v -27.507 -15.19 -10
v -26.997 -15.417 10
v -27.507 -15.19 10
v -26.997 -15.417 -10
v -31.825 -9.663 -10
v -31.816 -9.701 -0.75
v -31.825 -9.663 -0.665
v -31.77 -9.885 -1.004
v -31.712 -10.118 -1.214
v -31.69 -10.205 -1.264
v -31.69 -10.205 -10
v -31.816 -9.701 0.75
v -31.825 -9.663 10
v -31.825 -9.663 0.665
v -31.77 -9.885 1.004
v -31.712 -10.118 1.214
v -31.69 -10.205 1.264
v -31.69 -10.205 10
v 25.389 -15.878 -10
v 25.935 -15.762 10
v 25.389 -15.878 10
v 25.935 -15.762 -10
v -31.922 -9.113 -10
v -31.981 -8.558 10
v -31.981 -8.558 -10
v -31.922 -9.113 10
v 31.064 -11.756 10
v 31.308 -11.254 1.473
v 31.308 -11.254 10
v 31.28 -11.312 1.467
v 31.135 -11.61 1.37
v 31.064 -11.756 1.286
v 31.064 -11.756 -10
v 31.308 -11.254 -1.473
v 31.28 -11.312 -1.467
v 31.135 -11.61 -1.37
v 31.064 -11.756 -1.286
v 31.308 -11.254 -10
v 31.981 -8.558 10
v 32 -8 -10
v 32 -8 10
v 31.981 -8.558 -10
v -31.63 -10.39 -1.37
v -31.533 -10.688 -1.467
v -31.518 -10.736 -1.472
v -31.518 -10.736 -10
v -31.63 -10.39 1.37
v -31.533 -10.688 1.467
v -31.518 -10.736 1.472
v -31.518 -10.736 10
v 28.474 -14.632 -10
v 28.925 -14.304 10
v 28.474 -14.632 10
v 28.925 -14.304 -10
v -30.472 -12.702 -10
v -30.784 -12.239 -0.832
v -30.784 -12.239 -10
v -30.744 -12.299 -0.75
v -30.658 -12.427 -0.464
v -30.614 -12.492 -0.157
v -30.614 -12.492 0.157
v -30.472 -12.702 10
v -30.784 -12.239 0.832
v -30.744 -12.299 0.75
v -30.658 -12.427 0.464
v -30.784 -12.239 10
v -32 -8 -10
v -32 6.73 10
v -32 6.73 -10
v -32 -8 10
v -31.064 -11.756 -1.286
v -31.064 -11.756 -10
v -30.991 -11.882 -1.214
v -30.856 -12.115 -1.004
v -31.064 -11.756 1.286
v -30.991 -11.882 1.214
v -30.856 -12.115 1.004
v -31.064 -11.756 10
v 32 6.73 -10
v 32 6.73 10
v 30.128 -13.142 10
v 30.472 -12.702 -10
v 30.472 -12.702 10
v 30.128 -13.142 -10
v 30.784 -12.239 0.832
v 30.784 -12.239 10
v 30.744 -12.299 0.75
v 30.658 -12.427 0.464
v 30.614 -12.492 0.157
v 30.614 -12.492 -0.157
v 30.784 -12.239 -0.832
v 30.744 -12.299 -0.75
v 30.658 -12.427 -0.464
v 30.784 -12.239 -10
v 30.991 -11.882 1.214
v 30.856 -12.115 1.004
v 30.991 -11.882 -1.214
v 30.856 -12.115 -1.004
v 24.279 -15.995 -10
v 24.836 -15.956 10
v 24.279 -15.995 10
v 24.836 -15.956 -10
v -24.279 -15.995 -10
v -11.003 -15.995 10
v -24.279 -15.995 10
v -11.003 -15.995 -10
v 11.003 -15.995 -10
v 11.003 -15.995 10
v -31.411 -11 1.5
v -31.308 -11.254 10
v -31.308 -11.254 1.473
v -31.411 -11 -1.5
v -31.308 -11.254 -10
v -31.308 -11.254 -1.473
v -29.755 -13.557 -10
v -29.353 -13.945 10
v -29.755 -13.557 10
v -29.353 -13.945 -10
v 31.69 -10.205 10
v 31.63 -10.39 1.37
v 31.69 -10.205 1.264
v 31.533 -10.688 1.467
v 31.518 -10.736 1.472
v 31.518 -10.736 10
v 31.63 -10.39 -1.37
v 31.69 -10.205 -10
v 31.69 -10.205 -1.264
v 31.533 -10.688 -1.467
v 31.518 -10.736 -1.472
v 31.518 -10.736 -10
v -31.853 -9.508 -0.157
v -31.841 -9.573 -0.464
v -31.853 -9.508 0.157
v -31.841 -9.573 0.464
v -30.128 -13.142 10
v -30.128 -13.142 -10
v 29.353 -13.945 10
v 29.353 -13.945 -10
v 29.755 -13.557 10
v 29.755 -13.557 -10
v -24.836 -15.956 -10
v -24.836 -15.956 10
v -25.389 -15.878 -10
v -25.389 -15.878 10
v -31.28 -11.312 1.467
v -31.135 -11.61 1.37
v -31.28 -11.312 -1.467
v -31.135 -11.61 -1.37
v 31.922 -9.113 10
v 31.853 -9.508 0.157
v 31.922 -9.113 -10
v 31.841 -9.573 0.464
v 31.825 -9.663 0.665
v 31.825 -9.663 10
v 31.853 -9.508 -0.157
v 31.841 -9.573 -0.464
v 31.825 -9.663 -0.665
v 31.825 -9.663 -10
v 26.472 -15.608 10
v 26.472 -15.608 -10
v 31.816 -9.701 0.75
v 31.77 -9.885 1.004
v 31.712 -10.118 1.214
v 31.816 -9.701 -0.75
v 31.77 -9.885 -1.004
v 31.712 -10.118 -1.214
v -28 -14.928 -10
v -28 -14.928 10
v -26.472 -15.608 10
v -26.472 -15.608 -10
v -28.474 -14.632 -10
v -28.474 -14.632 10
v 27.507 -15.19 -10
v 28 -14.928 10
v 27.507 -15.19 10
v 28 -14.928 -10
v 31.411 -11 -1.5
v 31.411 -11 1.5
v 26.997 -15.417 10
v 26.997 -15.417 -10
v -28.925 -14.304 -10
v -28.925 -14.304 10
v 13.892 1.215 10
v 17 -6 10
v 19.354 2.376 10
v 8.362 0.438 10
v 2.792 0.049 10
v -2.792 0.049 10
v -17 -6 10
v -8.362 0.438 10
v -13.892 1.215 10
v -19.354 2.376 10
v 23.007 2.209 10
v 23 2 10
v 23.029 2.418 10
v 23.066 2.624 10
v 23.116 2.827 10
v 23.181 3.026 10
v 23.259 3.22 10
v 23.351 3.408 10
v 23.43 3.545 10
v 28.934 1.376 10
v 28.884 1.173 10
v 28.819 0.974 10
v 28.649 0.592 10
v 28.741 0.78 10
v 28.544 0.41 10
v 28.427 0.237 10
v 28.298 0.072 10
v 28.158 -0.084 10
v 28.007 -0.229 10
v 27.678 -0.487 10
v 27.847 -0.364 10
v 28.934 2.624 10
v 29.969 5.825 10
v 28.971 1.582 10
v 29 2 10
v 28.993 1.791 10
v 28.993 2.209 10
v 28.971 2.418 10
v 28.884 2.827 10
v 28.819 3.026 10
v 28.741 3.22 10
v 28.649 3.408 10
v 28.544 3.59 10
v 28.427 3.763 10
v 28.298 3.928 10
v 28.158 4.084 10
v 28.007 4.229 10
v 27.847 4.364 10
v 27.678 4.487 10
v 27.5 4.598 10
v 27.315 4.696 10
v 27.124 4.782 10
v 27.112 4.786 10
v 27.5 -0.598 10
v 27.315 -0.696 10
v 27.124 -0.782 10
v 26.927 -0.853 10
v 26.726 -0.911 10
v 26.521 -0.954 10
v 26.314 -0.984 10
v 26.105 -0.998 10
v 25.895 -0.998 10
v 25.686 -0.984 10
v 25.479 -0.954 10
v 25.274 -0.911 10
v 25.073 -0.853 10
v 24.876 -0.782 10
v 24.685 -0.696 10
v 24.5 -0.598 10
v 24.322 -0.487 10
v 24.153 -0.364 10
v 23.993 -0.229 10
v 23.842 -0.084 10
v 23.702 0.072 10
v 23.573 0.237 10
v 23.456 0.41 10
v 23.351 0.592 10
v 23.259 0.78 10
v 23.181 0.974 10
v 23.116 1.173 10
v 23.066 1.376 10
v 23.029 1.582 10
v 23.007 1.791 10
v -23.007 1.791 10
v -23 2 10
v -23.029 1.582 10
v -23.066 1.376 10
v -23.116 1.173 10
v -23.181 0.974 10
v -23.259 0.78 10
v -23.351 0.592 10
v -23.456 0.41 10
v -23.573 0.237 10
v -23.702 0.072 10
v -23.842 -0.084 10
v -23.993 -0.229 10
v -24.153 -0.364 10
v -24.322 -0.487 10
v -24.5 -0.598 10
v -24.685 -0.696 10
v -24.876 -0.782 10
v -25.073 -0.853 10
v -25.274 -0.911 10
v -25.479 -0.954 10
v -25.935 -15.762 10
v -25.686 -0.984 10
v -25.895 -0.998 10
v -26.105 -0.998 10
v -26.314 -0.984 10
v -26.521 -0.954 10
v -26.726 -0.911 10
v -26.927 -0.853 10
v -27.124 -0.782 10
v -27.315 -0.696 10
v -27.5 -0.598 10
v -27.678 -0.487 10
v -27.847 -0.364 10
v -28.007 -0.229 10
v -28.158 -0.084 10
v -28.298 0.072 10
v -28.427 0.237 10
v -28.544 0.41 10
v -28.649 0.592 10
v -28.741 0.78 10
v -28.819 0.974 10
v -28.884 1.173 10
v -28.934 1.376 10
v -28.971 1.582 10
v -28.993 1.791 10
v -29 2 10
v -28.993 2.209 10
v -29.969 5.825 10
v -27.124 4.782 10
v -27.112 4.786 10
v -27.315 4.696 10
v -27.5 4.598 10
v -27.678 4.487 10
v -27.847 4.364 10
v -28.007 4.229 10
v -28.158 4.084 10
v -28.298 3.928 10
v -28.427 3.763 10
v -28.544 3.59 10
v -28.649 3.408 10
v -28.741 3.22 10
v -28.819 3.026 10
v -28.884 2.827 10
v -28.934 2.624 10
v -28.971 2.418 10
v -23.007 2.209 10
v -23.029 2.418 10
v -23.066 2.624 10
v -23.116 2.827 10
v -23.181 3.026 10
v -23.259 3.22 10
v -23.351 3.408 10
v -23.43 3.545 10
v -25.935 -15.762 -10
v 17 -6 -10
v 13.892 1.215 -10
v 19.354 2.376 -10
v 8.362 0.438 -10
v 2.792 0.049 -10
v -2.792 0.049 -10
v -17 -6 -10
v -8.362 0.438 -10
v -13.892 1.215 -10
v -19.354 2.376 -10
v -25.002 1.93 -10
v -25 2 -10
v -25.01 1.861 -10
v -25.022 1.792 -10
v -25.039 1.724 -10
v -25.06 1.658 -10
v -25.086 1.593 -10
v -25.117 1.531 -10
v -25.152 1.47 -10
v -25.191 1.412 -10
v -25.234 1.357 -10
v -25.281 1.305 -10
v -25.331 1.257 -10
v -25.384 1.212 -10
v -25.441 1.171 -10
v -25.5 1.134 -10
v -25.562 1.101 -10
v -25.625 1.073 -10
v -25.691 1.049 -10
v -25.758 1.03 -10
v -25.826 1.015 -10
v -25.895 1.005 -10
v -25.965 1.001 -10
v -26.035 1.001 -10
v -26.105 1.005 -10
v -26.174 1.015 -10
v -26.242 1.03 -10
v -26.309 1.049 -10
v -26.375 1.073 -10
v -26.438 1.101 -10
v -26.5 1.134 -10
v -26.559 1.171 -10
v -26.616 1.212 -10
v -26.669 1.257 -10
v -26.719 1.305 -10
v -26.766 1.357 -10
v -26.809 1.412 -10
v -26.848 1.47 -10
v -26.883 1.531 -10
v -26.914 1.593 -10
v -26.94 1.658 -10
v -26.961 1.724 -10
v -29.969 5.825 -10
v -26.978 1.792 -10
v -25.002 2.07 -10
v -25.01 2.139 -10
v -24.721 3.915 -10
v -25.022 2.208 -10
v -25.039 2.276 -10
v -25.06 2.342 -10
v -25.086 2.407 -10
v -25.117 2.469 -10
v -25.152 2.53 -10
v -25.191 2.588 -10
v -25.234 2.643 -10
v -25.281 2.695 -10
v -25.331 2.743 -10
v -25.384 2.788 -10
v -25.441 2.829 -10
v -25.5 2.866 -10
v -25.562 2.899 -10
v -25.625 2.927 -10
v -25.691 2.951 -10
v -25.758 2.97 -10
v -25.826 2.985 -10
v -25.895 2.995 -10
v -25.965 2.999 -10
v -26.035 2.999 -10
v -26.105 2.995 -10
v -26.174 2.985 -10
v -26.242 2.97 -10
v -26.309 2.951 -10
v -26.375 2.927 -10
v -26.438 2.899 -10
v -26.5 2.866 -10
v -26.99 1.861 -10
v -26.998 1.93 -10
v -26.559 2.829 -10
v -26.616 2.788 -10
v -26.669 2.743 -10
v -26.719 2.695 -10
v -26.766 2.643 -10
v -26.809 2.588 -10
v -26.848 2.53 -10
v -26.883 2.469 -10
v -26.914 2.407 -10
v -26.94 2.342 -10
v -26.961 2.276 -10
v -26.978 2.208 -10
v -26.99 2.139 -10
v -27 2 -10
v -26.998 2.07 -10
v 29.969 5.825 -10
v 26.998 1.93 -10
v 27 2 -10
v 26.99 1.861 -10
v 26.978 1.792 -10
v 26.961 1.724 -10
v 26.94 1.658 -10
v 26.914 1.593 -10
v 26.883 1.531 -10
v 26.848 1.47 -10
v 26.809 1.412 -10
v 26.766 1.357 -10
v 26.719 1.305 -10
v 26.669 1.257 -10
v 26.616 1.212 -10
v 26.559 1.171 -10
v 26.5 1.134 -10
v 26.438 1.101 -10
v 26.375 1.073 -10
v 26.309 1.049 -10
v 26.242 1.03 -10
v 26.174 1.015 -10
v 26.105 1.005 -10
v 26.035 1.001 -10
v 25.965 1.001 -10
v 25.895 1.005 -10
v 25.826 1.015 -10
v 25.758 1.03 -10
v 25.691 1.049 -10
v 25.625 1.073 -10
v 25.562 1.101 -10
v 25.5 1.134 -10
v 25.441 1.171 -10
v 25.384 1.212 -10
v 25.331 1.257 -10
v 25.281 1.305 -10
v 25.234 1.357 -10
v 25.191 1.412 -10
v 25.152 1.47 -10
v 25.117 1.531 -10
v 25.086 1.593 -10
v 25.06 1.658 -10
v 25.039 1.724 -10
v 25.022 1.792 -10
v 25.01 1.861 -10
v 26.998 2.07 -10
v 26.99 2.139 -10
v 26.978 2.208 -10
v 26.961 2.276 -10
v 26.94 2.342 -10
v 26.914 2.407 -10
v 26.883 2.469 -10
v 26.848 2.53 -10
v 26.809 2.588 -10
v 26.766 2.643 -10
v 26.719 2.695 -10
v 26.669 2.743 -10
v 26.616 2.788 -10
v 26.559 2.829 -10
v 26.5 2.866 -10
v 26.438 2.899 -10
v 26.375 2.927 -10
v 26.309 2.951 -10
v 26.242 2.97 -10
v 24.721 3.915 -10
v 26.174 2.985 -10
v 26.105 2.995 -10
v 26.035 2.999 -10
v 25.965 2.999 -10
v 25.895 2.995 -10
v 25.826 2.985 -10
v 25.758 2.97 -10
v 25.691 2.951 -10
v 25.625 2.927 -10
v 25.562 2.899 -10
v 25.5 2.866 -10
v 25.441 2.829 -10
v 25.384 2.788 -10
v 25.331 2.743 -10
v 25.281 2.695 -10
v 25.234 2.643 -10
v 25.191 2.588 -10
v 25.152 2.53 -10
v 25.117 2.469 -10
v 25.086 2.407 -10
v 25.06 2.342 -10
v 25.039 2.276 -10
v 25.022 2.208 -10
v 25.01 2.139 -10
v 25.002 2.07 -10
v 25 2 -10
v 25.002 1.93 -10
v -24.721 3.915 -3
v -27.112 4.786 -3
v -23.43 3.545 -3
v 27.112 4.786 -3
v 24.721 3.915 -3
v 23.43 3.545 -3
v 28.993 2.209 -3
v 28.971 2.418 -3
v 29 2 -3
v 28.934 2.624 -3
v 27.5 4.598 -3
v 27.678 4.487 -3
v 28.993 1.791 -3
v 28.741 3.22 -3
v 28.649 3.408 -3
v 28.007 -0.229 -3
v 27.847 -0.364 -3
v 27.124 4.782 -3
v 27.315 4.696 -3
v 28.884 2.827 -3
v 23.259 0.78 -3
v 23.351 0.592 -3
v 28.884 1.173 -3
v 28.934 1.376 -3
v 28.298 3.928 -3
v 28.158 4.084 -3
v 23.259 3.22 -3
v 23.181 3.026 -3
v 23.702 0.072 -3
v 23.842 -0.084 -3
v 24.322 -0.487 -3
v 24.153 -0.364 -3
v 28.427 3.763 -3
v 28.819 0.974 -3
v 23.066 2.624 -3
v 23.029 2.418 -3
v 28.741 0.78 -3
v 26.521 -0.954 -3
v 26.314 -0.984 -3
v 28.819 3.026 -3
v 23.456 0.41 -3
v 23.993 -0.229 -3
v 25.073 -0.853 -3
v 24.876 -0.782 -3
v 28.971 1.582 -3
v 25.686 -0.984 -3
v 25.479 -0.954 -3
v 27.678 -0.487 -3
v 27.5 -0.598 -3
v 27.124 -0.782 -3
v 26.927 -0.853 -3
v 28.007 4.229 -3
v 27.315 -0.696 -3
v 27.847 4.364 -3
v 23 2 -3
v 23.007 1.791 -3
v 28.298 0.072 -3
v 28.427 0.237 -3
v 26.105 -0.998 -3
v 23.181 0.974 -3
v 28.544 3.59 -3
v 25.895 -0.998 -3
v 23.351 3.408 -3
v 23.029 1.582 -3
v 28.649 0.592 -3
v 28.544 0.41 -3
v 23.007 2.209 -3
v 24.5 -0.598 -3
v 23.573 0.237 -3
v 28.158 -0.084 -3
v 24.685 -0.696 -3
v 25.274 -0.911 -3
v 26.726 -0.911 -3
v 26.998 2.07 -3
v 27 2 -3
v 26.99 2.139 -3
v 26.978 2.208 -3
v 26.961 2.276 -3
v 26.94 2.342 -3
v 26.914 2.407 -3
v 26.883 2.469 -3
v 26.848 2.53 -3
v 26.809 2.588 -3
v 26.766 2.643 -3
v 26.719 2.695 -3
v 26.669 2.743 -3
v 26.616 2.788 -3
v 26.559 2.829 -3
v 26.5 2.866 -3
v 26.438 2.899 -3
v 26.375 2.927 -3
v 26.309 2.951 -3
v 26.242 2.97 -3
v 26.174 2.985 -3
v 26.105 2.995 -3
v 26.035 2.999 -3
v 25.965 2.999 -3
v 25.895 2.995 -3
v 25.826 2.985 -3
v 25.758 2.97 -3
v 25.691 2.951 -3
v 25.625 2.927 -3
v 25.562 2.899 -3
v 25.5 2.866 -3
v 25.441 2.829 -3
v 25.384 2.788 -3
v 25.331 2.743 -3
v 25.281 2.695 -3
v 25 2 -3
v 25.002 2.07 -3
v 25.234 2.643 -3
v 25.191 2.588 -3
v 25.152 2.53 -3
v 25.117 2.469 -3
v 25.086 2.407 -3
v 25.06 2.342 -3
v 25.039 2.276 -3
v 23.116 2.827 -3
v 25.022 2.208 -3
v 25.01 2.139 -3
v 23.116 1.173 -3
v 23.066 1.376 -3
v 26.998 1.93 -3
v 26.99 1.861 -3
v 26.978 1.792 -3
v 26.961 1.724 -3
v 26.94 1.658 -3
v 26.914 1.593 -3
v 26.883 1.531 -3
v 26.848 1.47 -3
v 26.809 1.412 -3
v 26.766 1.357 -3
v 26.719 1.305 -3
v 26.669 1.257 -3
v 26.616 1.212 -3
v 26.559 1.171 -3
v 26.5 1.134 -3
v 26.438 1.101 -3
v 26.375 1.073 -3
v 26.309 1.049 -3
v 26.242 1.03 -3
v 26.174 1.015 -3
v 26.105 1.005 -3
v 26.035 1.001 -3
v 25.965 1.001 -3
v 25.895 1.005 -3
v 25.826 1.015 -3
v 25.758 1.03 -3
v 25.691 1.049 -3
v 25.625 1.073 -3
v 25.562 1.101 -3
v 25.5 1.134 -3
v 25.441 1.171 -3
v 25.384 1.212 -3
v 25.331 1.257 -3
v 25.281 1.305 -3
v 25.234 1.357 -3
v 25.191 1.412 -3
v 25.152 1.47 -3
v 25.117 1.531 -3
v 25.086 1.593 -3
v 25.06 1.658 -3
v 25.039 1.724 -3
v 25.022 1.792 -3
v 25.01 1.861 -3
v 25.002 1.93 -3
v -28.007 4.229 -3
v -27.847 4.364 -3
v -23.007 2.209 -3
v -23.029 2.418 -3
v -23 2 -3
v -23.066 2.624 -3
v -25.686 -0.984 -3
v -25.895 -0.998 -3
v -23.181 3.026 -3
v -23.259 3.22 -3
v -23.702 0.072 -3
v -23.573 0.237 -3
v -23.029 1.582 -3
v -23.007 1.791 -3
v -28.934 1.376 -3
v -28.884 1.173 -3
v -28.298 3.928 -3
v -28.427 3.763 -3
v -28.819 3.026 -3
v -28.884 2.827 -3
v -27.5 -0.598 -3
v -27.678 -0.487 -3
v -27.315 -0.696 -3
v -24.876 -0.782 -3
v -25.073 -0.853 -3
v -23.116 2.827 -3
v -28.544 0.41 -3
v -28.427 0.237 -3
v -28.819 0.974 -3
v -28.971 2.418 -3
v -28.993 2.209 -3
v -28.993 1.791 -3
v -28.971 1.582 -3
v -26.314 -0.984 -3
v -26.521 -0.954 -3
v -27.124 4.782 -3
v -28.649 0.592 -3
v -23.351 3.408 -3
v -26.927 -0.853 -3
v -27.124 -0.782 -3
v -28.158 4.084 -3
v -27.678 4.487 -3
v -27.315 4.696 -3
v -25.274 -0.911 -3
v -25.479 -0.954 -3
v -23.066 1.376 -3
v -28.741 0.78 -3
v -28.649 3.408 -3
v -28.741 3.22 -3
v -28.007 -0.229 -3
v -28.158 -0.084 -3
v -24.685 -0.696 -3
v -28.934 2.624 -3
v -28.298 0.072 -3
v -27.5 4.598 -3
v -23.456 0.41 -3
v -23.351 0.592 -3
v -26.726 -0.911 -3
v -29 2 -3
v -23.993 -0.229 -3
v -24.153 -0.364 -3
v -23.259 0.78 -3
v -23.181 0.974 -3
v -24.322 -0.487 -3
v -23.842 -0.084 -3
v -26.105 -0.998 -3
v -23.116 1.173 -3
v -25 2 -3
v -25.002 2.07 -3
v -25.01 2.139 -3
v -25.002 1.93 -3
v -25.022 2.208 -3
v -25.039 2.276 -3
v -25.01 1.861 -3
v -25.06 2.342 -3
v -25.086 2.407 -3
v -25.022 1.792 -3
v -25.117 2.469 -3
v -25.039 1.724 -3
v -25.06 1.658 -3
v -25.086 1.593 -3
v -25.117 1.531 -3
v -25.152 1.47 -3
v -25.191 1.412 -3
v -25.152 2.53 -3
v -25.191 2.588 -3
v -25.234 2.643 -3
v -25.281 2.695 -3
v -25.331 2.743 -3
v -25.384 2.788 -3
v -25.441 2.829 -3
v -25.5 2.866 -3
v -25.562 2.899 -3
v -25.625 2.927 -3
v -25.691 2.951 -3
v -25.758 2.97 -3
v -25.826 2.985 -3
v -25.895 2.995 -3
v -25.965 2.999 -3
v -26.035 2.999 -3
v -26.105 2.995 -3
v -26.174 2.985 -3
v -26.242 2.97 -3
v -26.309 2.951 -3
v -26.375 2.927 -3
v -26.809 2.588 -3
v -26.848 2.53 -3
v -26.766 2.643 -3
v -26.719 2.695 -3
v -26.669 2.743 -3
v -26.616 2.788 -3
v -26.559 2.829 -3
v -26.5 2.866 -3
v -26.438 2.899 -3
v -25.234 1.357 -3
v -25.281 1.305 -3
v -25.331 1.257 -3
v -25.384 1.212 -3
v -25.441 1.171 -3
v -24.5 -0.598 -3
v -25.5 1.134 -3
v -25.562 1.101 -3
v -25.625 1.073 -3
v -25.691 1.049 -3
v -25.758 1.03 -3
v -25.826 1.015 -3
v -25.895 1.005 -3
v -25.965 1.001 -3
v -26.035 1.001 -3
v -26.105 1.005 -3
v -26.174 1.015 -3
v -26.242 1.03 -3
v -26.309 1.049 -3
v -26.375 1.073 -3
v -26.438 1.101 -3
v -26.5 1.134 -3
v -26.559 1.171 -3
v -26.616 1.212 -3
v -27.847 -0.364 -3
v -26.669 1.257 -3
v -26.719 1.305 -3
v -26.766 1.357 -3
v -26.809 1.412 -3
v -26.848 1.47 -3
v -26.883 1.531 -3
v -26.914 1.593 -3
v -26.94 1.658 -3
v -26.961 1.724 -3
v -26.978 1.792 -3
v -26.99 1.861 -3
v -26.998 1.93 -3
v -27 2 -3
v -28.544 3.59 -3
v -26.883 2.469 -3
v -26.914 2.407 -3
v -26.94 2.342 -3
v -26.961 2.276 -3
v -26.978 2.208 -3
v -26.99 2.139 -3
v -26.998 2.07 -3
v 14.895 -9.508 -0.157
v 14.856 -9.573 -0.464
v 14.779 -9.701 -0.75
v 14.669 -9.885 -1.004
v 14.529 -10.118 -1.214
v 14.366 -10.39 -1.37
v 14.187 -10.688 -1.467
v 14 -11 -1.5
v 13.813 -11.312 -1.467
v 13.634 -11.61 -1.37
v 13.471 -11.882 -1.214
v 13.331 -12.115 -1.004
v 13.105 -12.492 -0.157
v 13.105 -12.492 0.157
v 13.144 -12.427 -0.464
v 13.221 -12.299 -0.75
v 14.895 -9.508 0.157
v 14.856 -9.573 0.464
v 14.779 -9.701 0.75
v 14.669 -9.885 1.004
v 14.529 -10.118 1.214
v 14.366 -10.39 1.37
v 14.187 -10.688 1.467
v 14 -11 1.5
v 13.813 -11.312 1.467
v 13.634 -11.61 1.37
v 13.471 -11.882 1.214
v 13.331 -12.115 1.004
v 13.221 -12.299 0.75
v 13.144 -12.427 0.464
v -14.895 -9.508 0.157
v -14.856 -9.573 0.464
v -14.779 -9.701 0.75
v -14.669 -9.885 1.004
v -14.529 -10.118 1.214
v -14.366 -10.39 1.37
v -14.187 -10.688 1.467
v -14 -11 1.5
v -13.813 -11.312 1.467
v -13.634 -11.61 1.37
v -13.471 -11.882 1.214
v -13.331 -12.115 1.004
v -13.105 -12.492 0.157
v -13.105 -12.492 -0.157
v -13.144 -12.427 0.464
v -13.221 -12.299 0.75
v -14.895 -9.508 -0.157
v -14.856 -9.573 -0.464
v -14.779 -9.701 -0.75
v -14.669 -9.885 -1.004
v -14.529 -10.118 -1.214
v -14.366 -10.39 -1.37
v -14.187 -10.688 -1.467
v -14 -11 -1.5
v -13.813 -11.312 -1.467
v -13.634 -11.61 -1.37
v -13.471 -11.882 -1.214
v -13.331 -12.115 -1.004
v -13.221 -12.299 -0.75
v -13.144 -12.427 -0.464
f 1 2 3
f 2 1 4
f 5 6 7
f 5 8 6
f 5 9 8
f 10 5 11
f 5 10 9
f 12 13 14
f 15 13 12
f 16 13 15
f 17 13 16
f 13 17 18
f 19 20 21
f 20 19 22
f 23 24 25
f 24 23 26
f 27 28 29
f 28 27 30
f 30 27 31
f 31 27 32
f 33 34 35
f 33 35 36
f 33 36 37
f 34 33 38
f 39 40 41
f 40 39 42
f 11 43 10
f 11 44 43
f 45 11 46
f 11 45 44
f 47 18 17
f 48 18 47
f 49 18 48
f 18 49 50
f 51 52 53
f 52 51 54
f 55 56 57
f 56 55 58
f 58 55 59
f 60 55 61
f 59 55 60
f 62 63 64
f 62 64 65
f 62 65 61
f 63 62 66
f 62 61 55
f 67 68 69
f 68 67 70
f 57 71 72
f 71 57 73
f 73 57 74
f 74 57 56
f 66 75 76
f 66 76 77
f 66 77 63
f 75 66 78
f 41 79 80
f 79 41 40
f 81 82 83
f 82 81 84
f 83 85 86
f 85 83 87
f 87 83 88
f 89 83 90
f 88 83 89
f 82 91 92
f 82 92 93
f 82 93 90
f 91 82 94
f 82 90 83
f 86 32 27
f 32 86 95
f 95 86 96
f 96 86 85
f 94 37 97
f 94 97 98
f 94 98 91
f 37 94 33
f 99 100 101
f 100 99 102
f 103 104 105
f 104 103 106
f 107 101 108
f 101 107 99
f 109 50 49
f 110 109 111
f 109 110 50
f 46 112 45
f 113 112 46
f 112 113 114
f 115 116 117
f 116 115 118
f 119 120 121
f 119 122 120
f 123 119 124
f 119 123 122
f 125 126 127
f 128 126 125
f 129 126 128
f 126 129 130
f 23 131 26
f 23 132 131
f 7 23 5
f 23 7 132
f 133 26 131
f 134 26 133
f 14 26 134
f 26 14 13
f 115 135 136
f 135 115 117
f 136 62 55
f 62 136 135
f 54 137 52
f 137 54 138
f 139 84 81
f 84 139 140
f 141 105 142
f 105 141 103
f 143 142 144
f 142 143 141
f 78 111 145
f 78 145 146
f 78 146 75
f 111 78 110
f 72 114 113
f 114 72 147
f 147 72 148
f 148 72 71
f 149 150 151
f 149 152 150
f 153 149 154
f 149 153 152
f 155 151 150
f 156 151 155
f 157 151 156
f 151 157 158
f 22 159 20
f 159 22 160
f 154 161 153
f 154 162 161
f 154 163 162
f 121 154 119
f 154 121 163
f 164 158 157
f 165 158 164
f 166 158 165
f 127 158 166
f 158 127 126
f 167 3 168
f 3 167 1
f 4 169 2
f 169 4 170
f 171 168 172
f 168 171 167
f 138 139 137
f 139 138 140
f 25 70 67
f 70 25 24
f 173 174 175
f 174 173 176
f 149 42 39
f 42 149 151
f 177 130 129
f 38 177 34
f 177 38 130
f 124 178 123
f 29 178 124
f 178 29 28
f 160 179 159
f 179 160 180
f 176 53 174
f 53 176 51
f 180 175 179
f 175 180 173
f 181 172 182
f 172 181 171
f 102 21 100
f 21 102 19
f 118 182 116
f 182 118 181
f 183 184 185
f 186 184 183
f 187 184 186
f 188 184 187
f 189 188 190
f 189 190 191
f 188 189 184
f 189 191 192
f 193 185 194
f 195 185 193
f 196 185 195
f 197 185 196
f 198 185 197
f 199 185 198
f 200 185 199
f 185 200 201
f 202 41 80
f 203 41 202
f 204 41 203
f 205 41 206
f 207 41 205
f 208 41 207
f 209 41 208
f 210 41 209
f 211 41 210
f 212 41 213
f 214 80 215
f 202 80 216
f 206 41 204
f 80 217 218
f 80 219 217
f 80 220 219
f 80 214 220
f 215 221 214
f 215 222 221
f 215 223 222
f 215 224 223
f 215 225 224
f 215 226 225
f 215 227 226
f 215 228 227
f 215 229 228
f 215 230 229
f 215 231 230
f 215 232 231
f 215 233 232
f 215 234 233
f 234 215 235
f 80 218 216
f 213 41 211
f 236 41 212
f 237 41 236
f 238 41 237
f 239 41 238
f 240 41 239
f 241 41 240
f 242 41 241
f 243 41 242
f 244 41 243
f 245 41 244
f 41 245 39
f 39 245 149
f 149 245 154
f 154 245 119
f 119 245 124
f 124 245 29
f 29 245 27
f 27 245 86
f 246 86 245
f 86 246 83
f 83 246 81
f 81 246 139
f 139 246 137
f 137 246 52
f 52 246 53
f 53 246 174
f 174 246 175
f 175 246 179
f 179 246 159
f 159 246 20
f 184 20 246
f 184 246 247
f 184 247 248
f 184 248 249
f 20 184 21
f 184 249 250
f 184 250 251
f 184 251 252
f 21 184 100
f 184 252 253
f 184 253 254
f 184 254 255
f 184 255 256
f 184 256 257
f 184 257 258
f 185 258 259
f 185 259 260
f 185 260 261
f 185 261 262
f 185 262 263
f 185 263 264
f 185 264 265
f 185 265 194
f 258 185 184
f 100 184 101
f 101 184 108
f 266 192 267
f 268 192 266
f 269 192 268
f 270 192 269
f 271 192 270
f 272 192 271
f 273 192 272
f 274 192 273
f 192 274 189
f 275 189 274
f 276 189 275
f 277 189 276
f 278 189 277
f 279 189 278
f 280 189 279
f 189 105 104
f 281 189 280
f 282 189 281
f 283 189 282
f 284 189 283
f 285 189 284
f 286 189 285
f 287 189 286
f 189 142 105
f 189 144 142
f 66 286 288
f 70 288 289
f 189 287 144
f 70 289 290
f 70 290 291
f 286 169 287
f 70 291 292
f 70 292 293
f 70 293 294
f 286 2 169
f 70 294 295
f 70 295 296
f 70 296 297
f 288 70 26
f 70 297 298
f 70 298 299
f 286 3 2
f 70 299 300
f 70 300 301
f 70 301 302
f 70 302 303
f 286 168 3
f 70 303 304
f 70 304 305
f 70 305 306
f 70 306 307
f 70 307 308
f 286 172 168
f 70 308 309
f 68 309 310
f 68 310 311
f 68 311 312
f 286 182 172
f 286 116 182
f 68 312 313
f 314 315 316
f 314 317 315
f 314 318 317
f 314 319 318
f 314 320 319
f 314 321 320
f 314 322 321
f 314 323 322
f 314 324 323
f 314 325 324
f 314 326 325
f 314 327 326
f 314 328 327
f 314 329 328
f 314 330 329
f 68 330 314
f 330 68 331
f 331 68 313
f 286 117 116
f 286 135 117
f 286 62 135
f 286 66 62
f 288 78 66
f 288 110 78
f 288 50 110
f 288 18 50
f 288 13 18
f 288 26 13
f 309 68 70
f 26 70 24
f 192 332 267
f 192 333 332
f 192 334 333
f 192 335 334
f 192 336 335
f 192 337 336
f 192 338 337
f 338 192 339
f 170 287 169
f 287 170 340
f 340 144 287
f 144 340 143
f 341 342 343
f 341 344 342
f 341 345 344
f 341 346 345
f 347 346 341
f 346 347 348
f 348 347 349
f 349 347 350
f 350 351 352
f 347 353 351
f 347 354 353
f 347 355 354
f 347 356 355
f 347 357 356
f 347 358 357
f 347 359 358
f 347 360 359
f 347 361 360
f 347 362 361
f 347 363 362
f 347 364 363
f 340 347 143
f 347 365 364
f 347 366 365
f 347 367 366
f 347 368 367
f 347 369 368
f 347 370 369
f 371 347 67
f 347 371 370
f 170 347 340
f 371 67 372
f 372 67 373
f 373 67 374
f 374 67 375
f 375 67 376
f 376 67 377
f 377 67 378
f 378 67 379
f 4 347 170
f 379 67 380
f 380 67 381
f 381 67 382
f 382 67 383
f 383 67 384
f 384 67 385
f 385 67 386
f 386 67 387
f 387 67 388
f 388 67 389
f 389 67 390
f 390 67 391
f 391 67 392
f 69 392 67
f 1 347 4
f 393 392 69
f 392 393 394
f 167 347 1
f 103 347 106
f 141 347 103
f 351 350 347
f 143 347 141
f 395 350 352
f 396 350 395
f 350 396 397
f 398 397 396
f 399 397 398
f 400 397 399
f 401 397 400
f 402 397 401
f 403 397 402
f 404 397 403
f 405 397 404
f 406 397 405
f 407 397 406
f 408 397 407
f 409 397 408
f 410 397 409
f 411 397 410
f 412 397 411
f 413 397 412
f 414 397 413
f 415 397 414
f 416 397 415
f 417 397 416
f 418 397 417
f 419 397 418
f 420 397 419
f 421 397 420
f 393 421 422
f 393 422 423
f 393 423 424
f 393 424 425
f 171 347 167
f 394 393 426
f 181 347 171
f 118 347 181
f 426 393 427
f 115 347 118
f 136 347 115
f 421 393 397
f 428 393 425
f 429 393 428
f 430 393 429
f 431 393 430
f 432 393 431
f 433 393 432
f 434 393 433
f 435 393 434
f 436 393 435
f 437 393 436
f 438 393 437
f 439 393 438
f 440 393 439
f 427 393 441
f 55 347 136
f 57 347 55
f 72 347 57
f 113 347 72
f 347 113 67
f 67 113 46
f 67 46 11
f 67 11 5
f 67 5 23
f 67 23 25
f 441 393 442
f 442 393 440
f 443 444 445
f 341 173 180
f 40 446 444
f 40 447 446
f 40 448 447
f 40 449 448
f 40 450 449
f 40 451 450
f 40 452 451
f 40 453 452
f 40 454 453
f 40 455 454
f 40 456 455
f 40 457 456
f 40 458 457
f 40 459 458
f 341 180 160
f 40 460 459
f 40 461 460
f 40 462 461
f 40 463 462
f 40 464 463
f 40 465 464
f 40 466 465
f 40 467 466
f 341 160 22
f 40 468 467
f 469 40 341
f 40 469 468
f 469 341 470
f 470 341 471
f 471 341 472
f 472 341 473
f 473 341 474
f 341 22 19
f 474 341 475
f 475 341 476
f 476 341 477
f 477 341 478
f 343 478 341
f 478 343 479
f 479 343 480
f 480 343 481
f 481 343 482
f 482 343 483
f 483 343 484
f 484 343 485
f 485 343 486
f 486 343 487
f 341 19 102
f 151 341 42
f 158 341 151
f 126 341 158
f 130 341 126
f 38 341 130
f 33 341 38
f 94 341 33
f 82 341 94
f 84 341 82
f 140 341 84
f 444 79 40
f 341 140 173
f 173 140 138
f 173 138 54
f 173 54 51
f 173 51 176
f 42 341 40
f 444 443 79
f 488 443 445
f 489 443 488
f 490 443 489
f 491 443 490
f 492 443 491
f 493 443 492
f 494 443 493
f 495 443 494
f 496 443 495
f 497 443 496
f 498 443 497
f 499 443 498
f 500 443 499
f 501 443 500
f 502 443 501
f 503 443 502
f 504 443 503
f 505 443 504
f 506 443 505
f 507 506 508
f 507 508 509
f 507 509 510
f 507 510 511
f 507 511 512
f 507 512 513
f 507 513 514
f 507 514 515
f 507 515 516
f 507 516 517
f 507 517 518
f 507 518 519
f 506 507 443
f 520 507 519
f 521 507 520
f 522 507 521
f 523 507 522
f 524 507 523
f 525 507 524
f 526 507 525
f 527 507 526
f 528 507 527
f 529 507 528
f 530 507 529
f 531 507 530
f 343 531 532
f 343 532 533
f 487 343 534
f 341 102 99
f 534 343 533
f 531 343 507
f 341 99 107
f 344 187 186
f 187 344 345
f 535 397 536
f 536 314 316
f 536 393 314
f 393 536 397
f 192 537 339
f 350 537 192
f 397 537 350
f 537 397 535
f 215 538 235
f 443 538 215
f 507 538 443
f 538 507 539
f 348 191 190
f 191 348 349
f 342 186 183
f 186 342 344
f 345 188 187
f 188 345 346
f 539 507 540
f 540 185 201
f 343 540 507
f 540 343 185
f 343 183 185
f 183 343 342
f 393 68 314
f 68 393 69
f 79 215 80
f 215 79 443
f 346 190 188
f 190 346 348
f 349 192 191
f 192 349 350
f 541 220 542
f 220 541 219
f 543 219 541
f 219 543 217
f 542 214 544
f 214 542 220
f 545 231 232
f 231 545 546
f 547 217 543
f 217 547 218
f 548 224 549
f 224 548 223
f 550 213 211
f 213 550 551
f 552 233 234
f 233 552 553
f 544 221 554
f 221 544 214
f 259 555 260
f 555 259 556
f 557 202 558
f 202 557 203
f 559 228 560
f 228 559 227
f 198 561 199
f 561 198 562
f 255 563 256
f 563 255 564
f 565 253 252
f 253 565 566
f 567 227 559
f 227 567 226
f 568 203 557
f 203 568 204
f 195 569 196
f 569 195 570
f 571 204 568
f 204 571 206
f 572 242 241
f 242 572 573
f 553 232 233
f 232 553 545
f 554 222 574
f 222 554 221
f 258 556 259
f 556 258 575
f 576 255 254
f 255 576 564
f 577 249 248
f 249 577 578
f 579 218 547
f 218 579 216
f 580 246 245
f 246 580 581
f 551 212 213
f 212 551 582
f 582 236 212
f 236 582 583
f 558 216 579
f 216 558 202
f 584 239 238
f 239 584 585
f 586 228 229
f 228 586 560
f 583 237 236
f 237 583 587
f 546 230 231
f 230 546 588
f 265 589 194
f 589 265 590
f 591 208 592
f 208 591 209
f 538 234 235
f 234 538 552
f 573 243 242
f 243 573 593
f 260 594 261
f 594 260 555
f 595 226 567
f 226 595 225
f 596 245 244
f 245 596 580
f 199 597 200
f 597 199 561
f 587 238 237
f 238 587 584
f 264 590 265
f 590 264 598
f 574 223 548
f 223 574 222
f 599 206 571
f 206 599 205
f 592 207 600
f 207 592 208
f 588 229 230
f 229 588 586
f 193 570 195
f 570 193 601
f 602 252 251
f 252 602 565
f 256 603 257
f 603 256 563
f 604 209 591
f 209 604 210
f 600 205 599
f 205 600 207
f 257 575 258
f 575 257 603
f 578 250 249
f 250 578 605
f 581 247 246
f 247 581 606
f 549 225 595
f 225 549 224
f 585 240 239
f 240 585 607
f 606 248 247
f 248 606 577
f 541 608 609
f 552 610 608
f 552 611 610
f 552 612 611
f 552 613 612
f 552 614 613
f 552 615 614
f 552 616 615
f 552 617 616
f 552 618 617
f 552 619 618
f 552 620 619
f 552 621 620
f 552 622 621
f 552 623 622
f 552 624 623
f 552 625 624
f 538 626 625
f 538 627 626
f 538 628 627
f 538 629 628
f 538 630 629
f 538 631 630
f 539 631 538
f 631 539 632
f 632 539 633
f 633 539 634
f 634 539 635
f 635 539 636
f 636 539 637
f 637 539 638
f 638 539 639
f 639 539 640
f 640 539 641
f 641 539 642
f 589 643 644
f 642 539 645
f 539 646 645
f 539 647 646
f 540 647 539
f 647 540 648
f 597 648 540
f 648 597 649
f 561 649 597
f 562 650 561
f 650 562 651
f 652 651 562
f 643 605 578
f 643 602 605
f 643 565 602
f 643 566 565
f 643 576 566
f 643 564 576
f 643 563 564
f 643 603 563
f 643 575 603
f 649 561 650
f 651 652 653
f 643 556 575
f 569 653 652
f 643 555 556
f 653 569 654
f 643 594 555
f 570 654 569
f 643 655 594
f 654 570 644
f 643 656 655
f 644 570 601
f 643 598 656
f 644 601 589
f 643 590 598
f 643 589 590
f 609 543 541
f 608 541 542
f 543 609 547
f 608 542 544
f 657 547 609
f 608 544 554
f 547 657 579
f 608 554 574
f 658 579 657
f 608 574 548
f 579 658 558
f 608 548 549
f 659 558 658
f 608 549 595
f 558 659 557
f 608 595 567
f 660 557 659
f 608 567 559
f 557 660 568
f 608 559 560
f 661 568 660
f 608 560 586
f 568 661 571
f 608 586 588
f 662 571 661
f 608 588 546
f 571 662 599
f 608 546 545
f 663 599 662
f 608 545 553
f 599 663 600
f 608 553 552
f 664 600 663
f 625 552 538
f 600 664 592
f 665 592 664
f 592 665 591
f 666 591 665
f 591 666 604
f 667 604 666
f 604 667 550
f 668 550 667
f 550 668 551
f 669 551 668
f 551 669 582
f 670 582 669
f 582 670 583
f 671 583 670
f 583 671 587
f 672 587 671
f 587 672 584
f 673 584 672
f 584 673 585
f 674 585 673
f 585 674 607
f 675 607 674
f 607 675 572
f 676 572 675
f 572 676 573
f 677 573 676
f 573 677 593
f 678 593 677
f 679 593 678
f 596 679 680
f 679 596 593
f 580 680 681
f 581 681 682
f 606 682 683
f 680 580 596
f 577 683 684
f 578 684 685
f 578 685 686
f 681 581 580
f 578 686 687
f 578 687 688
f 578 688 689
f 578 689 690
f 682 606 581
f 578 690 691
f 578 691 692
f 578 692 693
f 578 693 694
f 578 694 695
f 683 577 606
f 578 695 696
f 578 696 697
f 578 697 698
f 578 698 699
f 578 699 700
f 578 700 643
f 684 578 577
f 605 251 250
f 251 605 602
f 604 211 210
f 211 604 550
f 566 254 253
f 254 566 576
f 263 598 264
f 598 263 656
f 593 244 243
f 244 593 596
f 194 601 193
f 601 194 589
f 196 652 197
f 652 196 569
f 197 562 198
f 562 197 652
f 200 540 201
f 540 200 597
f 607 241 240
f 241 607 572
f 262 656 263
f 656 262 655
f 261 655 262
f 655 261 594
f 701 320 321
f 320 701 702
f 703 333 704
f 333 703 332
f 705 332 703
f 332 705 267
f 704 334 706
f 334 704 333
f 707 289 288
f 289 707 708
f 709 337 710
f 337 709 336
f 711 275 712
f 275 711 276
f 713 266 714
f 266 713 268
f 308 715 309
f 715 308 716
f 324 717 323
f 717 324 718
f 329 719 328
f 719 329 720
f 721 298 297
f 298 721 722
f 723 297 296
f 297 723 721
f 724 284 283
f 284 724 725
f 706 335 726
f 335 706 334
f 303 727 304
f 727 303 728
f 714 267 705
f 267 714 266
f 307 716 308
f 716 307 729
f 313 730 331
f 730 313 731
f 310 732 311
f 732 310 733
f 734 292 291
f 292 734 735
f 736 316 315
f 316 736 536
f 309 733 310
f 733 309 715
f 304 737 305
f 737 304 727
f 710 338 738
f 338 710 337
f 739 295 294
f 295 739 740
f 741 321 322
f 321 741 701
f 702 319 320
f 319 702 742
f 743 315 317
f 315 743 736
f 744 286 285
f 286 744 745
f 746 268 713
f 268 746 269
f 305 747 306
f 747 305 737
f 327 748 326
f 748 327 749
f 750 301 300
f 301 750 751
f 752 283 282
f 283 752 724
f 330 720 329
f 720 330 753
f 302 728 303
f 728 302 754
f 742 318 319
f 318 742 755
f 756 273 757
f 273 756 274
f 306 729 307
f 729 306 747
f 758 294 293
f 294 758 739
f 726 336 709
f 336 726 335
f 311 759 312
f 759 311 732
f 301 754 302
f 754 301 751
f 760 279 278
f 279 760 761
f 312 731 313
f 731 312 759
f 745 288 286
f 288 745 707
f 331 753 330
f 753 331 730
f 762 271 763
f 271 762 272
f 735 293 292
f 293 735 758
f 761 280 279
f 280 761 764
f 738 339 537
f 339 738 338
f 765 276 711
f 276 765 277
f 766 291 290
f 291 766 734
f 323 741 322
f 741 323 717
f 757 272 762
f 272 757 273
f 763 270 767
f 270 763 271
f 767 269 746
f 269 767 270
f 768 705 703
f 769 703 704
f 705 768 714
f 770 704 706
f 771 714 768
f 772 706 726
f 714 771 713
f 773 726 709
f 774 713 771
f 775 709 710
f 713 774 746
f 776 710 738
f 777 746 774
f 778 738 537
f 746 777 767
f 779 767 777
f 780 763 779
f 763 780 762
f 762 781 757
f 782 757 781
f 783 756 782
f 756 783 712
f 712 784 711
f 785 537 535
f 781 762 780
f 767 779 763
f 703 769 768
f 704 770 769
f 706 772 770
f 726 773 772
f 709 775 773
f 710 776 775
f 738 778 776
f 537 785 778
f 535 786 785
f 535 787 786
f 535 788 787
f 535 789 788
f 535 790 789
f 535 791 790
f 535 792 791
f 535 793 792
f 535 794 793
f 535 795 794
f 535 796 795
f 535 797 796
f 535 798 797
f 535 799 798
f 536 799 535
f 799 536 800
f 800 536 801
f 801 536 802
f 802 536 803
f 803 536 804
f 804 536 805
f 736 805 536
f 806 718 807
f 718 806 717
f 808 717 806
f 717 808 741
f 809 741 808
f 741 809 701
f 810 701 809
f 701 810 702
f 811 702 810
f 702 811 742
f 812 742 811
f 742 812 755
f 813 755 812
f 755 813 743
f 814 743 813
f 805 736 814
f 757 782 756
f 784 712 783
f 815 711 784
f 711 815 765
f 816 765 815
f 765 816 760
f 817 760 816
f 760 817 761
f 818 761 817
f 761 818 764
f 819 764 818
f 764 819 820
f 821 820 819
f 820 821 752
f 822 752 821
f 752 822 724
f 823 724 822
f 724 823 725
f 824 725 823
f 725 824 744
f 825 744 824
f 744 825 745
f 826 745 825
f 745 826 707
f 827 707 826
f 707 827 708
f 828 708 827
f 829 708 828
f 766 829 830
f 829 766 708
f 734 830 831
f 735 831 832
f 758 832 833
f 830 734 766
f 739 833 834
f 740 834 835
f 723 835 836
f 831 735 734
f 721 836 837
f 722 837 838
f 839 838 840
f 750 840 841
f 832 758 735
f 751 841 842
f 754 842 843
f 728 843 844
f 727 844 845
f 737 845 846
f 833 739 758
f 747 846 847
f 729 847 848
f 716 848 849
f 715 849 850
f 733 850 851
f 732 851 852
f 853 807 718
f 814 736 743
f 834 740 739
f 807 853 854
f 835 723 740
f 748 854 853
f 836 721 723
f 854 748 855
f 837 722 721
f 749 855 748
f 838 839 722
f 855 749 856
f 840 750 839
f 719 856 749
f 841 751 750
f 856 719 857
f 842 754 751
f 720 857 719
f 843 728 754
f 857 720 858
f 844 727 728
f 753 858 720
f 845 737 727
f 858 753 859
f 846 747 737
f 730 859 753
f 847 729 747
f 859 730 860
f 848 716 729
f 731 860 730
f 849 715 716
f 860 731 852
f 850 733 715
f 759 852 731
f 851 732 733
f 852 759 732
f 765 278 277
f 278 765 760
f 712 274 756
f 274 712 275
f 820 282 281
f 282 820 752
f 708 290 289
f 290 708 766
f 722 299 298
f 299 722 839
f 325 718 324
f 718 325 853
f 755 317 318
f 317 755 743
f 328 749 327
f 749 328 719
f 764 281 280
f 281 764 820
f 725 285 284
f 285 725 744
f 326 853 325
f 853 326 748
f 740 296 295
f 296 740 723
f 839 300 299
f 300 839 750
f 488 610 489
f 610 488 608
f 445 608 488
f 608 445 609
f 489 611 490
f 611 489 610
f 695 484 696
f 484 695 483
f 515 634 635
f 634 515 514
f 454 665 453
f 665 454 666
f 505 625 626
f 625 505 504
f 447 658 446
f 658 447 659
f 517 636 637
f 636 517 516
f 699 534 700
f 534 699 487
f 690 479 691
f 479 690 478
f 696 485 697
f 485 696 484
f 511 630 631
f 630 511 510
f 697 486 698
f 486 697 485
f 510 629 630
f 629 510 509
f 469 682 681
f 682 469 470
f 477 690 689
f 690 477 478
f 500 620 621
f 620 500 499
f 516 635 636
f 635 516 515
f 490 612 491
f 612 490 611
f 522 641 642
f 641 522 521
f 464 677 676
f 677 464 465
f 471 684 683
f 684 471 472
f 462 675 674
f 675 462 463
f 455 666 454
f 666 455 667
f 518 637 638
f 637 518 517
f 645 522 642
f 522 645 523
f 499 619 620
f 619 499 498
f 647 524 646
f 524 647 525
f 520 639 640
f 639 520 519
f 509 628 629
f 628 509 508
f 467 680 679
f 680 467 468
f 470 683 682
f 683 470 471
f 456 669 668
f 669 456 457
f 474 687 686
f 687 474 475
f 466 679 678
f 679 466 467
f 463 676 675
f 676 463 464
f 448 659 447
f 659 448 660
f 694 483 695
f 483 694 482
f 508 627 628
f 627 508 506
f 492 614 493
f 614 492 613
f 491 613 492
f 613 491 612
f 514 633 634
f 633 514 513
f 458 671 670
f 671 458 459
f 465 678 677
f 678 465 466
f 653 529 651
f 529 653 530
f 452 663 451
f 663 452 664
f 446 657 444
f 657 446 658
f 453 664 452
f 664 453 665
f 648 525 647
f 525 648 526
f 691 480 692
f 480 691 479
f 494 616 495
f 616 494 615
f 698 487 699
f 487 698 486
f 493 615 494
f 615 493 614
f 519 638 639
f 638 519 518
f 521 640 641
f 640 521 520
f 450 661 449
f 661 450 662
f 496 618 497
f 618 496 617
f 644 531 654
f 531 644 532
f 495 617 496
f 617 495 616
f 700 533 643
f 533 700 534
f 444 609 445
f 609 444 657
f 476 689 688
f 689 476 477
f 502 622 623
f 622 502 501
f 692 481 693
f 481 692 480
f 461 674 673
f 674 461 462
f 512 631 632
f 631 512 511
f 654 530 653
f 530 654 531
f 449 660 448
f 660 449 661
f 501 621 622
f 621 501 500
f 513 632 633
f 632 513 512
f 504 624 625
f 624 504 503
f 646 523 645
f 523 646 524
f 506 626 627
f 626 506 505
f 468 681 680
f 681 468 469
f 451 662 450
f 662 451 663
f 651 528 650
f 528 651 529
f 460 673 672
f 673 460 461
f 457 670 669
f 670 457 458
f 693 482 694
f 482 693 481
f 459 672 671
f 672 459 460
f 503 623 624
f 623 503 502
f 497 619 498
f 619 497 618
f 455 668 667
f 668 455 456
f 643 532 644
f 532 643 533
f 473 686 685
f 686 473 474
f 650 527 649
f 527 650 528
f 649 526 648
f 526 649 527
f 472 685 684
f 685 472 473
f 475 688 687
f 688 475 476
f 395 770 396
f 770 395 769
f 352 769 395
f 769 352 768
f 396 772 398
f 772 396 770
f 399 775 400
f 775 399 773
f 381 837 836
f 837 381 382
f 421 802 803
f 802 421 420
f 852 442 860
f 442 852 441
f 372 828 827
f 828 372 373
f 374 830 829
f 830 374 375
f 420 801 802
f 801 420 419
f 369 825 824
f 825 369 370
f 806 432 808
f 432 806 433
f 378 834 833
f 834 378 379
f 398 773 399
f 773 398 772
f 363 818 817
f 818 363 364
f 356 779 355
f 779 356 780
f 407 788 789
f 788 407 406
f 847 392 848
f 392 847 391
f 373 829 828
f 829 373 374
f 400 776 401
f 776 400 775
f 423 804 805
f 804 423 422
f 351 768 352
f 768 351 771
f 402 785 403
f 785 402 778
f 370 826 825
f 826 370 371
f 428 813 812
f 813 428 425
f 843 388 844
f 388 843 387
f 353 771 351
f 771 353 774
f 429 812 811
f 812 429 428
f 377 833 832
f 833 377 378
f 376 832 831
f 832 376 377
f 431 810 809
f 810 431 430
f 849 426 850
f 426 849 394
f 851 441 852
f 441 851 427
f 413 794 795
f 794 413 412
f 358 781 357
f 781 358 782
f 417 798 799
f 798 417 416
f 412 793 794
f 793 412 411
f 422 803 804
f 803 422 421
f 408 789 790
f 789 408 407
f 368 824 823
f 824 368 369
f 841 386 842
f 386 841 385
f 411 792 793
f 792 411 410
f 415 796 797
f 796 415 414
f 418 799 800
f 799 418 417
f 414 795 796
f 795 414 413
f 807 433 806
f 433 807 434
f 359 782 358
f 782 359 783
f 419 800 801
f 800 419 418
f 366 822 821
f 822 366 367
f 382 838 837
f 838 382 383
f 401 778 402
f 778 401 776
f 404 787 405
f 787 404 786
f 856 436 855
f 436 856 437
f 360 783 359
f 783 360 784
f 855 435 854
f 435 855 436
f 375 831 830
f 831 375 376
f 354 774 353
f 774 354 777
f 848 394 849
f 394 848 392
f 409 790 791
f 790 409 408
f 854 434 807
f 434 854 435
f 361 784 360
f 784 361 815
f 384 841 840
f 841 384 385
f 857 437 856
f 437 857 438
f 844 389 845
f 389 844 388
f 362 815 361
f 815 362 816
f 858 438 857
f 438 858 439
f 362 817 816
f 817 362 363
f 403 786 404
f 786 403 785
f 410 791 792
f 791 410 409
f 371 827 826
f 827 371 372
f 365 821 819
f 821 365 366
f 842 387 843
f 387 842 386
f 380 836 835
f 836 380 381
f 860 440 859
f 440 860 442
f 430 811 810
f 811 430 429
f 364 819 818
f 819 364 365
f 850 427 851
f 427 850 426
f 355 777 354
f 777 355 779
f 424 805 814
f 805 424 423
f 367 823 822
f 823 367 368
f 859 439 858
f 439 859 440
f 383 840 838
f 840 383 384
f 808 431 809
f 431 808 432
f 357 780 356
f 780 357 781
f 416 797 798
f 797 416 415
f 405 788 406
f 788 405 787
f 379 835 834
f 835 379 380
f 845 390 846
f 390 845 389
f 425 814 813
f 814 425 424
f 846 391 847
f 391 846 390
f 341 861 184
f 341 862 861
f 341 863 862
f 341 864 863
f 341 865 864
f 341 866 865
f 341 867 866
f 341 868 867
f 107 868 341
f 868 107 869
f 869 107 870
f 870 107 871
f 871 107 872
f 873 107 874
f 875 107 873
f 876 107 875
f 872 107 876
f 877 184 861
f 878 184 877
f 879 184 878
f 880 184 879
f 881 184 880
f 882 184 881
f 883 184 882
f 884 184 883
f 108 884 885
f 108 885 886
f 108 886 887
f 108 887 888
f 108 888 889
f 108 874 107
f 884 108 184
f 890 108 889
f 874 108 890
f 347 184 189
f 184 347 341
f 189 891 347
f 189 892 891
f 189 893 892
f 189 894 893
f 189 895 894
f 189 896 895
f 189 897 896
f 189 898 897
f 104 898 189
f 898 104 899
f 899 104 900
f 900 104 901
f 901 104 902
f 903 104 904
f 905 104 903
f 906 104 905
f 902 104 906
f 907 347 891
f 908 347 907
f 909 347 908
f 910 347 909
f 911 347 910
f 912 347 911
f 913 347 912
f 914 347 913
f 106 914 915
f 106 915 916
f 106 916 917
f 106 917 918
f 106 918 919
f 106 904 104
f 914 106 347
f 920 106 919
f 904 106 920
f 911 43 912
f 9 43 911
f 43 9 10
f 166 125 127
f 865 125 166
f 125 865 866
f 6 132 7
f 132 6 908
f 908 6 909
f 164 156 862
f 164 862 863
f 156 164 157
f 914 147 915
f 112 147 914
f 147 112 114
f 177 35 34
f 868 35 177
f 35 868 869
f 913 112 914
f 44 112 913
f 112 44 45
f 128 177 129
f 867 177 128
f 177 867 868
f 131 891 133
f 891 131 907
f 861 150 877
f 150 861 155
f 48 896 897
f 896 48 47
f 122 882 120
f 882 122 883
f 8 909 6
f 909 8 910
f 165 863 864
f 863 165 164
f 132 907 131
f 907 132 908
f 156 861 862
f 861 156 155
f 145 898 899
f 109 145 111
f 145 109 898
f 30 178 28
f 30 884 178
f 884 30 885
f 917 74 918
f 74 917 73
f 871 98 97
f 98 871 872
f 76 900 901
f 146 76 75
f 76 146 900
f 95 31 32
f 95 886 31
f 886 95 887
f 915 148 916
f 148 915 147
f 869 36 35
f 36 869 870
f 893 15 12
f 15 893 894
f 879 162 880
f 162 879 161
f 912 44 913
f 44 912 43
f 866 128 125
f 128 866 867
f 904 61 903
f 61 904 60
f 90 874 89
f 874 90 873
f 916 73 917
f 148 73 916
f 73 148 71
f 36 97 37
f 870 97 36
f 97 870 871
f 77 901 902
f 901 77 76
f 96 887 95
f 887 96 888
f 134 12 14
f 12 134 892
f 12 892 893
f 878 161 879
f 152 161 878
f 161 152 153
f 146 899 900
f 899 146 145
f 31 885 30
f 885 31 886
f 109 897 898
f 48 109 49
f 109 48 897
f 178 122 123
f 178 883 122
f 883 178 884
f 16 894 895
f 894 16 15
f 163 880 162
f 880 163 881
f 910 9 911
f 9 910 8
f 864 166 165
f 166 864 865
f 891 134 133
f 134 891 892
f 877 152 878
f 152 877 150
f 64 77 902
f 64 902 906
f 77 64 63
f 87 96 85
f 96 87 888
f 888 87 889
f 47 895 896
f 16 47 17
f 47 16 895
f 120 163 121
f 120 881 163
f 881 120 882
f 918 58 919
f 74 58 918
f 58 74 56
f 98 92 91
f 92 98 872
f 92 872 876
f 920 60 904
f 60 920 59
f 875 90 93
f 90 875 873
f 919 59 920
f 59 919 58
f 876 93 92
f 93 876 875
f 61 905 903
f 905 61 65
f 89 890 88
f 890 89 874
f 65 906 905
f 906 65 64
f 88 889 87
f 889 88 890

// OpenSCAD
$fn=90;
difference(){

minkowski(){
    cube([48,16,10],center=true);
    cylinder(d=16,h=10,center=true);
}

translate([0,80,0])cylinder(d=160,h=22,center=true);

translate([26,2,8])cylinder(d=6,h=22,center=true);
translate([-26,2,8])cylinder(d=6,h=22,center=true);
translate([26,2,0])cylinder(d=2,h=22,center=true);
translate([-26,2,0])cylinder(d=2,h=22,center=true);

translate([0,-16,0])
linear_extrude (height=26,center=true)
    {
polygon( points=[[-11,0],[11,0],[17,10],[-17,10]]);
    }

translate([0,-11,0])
rotate([0,90,0])
cylinder(d=3,h=100,$fn=30,center=true);
}
